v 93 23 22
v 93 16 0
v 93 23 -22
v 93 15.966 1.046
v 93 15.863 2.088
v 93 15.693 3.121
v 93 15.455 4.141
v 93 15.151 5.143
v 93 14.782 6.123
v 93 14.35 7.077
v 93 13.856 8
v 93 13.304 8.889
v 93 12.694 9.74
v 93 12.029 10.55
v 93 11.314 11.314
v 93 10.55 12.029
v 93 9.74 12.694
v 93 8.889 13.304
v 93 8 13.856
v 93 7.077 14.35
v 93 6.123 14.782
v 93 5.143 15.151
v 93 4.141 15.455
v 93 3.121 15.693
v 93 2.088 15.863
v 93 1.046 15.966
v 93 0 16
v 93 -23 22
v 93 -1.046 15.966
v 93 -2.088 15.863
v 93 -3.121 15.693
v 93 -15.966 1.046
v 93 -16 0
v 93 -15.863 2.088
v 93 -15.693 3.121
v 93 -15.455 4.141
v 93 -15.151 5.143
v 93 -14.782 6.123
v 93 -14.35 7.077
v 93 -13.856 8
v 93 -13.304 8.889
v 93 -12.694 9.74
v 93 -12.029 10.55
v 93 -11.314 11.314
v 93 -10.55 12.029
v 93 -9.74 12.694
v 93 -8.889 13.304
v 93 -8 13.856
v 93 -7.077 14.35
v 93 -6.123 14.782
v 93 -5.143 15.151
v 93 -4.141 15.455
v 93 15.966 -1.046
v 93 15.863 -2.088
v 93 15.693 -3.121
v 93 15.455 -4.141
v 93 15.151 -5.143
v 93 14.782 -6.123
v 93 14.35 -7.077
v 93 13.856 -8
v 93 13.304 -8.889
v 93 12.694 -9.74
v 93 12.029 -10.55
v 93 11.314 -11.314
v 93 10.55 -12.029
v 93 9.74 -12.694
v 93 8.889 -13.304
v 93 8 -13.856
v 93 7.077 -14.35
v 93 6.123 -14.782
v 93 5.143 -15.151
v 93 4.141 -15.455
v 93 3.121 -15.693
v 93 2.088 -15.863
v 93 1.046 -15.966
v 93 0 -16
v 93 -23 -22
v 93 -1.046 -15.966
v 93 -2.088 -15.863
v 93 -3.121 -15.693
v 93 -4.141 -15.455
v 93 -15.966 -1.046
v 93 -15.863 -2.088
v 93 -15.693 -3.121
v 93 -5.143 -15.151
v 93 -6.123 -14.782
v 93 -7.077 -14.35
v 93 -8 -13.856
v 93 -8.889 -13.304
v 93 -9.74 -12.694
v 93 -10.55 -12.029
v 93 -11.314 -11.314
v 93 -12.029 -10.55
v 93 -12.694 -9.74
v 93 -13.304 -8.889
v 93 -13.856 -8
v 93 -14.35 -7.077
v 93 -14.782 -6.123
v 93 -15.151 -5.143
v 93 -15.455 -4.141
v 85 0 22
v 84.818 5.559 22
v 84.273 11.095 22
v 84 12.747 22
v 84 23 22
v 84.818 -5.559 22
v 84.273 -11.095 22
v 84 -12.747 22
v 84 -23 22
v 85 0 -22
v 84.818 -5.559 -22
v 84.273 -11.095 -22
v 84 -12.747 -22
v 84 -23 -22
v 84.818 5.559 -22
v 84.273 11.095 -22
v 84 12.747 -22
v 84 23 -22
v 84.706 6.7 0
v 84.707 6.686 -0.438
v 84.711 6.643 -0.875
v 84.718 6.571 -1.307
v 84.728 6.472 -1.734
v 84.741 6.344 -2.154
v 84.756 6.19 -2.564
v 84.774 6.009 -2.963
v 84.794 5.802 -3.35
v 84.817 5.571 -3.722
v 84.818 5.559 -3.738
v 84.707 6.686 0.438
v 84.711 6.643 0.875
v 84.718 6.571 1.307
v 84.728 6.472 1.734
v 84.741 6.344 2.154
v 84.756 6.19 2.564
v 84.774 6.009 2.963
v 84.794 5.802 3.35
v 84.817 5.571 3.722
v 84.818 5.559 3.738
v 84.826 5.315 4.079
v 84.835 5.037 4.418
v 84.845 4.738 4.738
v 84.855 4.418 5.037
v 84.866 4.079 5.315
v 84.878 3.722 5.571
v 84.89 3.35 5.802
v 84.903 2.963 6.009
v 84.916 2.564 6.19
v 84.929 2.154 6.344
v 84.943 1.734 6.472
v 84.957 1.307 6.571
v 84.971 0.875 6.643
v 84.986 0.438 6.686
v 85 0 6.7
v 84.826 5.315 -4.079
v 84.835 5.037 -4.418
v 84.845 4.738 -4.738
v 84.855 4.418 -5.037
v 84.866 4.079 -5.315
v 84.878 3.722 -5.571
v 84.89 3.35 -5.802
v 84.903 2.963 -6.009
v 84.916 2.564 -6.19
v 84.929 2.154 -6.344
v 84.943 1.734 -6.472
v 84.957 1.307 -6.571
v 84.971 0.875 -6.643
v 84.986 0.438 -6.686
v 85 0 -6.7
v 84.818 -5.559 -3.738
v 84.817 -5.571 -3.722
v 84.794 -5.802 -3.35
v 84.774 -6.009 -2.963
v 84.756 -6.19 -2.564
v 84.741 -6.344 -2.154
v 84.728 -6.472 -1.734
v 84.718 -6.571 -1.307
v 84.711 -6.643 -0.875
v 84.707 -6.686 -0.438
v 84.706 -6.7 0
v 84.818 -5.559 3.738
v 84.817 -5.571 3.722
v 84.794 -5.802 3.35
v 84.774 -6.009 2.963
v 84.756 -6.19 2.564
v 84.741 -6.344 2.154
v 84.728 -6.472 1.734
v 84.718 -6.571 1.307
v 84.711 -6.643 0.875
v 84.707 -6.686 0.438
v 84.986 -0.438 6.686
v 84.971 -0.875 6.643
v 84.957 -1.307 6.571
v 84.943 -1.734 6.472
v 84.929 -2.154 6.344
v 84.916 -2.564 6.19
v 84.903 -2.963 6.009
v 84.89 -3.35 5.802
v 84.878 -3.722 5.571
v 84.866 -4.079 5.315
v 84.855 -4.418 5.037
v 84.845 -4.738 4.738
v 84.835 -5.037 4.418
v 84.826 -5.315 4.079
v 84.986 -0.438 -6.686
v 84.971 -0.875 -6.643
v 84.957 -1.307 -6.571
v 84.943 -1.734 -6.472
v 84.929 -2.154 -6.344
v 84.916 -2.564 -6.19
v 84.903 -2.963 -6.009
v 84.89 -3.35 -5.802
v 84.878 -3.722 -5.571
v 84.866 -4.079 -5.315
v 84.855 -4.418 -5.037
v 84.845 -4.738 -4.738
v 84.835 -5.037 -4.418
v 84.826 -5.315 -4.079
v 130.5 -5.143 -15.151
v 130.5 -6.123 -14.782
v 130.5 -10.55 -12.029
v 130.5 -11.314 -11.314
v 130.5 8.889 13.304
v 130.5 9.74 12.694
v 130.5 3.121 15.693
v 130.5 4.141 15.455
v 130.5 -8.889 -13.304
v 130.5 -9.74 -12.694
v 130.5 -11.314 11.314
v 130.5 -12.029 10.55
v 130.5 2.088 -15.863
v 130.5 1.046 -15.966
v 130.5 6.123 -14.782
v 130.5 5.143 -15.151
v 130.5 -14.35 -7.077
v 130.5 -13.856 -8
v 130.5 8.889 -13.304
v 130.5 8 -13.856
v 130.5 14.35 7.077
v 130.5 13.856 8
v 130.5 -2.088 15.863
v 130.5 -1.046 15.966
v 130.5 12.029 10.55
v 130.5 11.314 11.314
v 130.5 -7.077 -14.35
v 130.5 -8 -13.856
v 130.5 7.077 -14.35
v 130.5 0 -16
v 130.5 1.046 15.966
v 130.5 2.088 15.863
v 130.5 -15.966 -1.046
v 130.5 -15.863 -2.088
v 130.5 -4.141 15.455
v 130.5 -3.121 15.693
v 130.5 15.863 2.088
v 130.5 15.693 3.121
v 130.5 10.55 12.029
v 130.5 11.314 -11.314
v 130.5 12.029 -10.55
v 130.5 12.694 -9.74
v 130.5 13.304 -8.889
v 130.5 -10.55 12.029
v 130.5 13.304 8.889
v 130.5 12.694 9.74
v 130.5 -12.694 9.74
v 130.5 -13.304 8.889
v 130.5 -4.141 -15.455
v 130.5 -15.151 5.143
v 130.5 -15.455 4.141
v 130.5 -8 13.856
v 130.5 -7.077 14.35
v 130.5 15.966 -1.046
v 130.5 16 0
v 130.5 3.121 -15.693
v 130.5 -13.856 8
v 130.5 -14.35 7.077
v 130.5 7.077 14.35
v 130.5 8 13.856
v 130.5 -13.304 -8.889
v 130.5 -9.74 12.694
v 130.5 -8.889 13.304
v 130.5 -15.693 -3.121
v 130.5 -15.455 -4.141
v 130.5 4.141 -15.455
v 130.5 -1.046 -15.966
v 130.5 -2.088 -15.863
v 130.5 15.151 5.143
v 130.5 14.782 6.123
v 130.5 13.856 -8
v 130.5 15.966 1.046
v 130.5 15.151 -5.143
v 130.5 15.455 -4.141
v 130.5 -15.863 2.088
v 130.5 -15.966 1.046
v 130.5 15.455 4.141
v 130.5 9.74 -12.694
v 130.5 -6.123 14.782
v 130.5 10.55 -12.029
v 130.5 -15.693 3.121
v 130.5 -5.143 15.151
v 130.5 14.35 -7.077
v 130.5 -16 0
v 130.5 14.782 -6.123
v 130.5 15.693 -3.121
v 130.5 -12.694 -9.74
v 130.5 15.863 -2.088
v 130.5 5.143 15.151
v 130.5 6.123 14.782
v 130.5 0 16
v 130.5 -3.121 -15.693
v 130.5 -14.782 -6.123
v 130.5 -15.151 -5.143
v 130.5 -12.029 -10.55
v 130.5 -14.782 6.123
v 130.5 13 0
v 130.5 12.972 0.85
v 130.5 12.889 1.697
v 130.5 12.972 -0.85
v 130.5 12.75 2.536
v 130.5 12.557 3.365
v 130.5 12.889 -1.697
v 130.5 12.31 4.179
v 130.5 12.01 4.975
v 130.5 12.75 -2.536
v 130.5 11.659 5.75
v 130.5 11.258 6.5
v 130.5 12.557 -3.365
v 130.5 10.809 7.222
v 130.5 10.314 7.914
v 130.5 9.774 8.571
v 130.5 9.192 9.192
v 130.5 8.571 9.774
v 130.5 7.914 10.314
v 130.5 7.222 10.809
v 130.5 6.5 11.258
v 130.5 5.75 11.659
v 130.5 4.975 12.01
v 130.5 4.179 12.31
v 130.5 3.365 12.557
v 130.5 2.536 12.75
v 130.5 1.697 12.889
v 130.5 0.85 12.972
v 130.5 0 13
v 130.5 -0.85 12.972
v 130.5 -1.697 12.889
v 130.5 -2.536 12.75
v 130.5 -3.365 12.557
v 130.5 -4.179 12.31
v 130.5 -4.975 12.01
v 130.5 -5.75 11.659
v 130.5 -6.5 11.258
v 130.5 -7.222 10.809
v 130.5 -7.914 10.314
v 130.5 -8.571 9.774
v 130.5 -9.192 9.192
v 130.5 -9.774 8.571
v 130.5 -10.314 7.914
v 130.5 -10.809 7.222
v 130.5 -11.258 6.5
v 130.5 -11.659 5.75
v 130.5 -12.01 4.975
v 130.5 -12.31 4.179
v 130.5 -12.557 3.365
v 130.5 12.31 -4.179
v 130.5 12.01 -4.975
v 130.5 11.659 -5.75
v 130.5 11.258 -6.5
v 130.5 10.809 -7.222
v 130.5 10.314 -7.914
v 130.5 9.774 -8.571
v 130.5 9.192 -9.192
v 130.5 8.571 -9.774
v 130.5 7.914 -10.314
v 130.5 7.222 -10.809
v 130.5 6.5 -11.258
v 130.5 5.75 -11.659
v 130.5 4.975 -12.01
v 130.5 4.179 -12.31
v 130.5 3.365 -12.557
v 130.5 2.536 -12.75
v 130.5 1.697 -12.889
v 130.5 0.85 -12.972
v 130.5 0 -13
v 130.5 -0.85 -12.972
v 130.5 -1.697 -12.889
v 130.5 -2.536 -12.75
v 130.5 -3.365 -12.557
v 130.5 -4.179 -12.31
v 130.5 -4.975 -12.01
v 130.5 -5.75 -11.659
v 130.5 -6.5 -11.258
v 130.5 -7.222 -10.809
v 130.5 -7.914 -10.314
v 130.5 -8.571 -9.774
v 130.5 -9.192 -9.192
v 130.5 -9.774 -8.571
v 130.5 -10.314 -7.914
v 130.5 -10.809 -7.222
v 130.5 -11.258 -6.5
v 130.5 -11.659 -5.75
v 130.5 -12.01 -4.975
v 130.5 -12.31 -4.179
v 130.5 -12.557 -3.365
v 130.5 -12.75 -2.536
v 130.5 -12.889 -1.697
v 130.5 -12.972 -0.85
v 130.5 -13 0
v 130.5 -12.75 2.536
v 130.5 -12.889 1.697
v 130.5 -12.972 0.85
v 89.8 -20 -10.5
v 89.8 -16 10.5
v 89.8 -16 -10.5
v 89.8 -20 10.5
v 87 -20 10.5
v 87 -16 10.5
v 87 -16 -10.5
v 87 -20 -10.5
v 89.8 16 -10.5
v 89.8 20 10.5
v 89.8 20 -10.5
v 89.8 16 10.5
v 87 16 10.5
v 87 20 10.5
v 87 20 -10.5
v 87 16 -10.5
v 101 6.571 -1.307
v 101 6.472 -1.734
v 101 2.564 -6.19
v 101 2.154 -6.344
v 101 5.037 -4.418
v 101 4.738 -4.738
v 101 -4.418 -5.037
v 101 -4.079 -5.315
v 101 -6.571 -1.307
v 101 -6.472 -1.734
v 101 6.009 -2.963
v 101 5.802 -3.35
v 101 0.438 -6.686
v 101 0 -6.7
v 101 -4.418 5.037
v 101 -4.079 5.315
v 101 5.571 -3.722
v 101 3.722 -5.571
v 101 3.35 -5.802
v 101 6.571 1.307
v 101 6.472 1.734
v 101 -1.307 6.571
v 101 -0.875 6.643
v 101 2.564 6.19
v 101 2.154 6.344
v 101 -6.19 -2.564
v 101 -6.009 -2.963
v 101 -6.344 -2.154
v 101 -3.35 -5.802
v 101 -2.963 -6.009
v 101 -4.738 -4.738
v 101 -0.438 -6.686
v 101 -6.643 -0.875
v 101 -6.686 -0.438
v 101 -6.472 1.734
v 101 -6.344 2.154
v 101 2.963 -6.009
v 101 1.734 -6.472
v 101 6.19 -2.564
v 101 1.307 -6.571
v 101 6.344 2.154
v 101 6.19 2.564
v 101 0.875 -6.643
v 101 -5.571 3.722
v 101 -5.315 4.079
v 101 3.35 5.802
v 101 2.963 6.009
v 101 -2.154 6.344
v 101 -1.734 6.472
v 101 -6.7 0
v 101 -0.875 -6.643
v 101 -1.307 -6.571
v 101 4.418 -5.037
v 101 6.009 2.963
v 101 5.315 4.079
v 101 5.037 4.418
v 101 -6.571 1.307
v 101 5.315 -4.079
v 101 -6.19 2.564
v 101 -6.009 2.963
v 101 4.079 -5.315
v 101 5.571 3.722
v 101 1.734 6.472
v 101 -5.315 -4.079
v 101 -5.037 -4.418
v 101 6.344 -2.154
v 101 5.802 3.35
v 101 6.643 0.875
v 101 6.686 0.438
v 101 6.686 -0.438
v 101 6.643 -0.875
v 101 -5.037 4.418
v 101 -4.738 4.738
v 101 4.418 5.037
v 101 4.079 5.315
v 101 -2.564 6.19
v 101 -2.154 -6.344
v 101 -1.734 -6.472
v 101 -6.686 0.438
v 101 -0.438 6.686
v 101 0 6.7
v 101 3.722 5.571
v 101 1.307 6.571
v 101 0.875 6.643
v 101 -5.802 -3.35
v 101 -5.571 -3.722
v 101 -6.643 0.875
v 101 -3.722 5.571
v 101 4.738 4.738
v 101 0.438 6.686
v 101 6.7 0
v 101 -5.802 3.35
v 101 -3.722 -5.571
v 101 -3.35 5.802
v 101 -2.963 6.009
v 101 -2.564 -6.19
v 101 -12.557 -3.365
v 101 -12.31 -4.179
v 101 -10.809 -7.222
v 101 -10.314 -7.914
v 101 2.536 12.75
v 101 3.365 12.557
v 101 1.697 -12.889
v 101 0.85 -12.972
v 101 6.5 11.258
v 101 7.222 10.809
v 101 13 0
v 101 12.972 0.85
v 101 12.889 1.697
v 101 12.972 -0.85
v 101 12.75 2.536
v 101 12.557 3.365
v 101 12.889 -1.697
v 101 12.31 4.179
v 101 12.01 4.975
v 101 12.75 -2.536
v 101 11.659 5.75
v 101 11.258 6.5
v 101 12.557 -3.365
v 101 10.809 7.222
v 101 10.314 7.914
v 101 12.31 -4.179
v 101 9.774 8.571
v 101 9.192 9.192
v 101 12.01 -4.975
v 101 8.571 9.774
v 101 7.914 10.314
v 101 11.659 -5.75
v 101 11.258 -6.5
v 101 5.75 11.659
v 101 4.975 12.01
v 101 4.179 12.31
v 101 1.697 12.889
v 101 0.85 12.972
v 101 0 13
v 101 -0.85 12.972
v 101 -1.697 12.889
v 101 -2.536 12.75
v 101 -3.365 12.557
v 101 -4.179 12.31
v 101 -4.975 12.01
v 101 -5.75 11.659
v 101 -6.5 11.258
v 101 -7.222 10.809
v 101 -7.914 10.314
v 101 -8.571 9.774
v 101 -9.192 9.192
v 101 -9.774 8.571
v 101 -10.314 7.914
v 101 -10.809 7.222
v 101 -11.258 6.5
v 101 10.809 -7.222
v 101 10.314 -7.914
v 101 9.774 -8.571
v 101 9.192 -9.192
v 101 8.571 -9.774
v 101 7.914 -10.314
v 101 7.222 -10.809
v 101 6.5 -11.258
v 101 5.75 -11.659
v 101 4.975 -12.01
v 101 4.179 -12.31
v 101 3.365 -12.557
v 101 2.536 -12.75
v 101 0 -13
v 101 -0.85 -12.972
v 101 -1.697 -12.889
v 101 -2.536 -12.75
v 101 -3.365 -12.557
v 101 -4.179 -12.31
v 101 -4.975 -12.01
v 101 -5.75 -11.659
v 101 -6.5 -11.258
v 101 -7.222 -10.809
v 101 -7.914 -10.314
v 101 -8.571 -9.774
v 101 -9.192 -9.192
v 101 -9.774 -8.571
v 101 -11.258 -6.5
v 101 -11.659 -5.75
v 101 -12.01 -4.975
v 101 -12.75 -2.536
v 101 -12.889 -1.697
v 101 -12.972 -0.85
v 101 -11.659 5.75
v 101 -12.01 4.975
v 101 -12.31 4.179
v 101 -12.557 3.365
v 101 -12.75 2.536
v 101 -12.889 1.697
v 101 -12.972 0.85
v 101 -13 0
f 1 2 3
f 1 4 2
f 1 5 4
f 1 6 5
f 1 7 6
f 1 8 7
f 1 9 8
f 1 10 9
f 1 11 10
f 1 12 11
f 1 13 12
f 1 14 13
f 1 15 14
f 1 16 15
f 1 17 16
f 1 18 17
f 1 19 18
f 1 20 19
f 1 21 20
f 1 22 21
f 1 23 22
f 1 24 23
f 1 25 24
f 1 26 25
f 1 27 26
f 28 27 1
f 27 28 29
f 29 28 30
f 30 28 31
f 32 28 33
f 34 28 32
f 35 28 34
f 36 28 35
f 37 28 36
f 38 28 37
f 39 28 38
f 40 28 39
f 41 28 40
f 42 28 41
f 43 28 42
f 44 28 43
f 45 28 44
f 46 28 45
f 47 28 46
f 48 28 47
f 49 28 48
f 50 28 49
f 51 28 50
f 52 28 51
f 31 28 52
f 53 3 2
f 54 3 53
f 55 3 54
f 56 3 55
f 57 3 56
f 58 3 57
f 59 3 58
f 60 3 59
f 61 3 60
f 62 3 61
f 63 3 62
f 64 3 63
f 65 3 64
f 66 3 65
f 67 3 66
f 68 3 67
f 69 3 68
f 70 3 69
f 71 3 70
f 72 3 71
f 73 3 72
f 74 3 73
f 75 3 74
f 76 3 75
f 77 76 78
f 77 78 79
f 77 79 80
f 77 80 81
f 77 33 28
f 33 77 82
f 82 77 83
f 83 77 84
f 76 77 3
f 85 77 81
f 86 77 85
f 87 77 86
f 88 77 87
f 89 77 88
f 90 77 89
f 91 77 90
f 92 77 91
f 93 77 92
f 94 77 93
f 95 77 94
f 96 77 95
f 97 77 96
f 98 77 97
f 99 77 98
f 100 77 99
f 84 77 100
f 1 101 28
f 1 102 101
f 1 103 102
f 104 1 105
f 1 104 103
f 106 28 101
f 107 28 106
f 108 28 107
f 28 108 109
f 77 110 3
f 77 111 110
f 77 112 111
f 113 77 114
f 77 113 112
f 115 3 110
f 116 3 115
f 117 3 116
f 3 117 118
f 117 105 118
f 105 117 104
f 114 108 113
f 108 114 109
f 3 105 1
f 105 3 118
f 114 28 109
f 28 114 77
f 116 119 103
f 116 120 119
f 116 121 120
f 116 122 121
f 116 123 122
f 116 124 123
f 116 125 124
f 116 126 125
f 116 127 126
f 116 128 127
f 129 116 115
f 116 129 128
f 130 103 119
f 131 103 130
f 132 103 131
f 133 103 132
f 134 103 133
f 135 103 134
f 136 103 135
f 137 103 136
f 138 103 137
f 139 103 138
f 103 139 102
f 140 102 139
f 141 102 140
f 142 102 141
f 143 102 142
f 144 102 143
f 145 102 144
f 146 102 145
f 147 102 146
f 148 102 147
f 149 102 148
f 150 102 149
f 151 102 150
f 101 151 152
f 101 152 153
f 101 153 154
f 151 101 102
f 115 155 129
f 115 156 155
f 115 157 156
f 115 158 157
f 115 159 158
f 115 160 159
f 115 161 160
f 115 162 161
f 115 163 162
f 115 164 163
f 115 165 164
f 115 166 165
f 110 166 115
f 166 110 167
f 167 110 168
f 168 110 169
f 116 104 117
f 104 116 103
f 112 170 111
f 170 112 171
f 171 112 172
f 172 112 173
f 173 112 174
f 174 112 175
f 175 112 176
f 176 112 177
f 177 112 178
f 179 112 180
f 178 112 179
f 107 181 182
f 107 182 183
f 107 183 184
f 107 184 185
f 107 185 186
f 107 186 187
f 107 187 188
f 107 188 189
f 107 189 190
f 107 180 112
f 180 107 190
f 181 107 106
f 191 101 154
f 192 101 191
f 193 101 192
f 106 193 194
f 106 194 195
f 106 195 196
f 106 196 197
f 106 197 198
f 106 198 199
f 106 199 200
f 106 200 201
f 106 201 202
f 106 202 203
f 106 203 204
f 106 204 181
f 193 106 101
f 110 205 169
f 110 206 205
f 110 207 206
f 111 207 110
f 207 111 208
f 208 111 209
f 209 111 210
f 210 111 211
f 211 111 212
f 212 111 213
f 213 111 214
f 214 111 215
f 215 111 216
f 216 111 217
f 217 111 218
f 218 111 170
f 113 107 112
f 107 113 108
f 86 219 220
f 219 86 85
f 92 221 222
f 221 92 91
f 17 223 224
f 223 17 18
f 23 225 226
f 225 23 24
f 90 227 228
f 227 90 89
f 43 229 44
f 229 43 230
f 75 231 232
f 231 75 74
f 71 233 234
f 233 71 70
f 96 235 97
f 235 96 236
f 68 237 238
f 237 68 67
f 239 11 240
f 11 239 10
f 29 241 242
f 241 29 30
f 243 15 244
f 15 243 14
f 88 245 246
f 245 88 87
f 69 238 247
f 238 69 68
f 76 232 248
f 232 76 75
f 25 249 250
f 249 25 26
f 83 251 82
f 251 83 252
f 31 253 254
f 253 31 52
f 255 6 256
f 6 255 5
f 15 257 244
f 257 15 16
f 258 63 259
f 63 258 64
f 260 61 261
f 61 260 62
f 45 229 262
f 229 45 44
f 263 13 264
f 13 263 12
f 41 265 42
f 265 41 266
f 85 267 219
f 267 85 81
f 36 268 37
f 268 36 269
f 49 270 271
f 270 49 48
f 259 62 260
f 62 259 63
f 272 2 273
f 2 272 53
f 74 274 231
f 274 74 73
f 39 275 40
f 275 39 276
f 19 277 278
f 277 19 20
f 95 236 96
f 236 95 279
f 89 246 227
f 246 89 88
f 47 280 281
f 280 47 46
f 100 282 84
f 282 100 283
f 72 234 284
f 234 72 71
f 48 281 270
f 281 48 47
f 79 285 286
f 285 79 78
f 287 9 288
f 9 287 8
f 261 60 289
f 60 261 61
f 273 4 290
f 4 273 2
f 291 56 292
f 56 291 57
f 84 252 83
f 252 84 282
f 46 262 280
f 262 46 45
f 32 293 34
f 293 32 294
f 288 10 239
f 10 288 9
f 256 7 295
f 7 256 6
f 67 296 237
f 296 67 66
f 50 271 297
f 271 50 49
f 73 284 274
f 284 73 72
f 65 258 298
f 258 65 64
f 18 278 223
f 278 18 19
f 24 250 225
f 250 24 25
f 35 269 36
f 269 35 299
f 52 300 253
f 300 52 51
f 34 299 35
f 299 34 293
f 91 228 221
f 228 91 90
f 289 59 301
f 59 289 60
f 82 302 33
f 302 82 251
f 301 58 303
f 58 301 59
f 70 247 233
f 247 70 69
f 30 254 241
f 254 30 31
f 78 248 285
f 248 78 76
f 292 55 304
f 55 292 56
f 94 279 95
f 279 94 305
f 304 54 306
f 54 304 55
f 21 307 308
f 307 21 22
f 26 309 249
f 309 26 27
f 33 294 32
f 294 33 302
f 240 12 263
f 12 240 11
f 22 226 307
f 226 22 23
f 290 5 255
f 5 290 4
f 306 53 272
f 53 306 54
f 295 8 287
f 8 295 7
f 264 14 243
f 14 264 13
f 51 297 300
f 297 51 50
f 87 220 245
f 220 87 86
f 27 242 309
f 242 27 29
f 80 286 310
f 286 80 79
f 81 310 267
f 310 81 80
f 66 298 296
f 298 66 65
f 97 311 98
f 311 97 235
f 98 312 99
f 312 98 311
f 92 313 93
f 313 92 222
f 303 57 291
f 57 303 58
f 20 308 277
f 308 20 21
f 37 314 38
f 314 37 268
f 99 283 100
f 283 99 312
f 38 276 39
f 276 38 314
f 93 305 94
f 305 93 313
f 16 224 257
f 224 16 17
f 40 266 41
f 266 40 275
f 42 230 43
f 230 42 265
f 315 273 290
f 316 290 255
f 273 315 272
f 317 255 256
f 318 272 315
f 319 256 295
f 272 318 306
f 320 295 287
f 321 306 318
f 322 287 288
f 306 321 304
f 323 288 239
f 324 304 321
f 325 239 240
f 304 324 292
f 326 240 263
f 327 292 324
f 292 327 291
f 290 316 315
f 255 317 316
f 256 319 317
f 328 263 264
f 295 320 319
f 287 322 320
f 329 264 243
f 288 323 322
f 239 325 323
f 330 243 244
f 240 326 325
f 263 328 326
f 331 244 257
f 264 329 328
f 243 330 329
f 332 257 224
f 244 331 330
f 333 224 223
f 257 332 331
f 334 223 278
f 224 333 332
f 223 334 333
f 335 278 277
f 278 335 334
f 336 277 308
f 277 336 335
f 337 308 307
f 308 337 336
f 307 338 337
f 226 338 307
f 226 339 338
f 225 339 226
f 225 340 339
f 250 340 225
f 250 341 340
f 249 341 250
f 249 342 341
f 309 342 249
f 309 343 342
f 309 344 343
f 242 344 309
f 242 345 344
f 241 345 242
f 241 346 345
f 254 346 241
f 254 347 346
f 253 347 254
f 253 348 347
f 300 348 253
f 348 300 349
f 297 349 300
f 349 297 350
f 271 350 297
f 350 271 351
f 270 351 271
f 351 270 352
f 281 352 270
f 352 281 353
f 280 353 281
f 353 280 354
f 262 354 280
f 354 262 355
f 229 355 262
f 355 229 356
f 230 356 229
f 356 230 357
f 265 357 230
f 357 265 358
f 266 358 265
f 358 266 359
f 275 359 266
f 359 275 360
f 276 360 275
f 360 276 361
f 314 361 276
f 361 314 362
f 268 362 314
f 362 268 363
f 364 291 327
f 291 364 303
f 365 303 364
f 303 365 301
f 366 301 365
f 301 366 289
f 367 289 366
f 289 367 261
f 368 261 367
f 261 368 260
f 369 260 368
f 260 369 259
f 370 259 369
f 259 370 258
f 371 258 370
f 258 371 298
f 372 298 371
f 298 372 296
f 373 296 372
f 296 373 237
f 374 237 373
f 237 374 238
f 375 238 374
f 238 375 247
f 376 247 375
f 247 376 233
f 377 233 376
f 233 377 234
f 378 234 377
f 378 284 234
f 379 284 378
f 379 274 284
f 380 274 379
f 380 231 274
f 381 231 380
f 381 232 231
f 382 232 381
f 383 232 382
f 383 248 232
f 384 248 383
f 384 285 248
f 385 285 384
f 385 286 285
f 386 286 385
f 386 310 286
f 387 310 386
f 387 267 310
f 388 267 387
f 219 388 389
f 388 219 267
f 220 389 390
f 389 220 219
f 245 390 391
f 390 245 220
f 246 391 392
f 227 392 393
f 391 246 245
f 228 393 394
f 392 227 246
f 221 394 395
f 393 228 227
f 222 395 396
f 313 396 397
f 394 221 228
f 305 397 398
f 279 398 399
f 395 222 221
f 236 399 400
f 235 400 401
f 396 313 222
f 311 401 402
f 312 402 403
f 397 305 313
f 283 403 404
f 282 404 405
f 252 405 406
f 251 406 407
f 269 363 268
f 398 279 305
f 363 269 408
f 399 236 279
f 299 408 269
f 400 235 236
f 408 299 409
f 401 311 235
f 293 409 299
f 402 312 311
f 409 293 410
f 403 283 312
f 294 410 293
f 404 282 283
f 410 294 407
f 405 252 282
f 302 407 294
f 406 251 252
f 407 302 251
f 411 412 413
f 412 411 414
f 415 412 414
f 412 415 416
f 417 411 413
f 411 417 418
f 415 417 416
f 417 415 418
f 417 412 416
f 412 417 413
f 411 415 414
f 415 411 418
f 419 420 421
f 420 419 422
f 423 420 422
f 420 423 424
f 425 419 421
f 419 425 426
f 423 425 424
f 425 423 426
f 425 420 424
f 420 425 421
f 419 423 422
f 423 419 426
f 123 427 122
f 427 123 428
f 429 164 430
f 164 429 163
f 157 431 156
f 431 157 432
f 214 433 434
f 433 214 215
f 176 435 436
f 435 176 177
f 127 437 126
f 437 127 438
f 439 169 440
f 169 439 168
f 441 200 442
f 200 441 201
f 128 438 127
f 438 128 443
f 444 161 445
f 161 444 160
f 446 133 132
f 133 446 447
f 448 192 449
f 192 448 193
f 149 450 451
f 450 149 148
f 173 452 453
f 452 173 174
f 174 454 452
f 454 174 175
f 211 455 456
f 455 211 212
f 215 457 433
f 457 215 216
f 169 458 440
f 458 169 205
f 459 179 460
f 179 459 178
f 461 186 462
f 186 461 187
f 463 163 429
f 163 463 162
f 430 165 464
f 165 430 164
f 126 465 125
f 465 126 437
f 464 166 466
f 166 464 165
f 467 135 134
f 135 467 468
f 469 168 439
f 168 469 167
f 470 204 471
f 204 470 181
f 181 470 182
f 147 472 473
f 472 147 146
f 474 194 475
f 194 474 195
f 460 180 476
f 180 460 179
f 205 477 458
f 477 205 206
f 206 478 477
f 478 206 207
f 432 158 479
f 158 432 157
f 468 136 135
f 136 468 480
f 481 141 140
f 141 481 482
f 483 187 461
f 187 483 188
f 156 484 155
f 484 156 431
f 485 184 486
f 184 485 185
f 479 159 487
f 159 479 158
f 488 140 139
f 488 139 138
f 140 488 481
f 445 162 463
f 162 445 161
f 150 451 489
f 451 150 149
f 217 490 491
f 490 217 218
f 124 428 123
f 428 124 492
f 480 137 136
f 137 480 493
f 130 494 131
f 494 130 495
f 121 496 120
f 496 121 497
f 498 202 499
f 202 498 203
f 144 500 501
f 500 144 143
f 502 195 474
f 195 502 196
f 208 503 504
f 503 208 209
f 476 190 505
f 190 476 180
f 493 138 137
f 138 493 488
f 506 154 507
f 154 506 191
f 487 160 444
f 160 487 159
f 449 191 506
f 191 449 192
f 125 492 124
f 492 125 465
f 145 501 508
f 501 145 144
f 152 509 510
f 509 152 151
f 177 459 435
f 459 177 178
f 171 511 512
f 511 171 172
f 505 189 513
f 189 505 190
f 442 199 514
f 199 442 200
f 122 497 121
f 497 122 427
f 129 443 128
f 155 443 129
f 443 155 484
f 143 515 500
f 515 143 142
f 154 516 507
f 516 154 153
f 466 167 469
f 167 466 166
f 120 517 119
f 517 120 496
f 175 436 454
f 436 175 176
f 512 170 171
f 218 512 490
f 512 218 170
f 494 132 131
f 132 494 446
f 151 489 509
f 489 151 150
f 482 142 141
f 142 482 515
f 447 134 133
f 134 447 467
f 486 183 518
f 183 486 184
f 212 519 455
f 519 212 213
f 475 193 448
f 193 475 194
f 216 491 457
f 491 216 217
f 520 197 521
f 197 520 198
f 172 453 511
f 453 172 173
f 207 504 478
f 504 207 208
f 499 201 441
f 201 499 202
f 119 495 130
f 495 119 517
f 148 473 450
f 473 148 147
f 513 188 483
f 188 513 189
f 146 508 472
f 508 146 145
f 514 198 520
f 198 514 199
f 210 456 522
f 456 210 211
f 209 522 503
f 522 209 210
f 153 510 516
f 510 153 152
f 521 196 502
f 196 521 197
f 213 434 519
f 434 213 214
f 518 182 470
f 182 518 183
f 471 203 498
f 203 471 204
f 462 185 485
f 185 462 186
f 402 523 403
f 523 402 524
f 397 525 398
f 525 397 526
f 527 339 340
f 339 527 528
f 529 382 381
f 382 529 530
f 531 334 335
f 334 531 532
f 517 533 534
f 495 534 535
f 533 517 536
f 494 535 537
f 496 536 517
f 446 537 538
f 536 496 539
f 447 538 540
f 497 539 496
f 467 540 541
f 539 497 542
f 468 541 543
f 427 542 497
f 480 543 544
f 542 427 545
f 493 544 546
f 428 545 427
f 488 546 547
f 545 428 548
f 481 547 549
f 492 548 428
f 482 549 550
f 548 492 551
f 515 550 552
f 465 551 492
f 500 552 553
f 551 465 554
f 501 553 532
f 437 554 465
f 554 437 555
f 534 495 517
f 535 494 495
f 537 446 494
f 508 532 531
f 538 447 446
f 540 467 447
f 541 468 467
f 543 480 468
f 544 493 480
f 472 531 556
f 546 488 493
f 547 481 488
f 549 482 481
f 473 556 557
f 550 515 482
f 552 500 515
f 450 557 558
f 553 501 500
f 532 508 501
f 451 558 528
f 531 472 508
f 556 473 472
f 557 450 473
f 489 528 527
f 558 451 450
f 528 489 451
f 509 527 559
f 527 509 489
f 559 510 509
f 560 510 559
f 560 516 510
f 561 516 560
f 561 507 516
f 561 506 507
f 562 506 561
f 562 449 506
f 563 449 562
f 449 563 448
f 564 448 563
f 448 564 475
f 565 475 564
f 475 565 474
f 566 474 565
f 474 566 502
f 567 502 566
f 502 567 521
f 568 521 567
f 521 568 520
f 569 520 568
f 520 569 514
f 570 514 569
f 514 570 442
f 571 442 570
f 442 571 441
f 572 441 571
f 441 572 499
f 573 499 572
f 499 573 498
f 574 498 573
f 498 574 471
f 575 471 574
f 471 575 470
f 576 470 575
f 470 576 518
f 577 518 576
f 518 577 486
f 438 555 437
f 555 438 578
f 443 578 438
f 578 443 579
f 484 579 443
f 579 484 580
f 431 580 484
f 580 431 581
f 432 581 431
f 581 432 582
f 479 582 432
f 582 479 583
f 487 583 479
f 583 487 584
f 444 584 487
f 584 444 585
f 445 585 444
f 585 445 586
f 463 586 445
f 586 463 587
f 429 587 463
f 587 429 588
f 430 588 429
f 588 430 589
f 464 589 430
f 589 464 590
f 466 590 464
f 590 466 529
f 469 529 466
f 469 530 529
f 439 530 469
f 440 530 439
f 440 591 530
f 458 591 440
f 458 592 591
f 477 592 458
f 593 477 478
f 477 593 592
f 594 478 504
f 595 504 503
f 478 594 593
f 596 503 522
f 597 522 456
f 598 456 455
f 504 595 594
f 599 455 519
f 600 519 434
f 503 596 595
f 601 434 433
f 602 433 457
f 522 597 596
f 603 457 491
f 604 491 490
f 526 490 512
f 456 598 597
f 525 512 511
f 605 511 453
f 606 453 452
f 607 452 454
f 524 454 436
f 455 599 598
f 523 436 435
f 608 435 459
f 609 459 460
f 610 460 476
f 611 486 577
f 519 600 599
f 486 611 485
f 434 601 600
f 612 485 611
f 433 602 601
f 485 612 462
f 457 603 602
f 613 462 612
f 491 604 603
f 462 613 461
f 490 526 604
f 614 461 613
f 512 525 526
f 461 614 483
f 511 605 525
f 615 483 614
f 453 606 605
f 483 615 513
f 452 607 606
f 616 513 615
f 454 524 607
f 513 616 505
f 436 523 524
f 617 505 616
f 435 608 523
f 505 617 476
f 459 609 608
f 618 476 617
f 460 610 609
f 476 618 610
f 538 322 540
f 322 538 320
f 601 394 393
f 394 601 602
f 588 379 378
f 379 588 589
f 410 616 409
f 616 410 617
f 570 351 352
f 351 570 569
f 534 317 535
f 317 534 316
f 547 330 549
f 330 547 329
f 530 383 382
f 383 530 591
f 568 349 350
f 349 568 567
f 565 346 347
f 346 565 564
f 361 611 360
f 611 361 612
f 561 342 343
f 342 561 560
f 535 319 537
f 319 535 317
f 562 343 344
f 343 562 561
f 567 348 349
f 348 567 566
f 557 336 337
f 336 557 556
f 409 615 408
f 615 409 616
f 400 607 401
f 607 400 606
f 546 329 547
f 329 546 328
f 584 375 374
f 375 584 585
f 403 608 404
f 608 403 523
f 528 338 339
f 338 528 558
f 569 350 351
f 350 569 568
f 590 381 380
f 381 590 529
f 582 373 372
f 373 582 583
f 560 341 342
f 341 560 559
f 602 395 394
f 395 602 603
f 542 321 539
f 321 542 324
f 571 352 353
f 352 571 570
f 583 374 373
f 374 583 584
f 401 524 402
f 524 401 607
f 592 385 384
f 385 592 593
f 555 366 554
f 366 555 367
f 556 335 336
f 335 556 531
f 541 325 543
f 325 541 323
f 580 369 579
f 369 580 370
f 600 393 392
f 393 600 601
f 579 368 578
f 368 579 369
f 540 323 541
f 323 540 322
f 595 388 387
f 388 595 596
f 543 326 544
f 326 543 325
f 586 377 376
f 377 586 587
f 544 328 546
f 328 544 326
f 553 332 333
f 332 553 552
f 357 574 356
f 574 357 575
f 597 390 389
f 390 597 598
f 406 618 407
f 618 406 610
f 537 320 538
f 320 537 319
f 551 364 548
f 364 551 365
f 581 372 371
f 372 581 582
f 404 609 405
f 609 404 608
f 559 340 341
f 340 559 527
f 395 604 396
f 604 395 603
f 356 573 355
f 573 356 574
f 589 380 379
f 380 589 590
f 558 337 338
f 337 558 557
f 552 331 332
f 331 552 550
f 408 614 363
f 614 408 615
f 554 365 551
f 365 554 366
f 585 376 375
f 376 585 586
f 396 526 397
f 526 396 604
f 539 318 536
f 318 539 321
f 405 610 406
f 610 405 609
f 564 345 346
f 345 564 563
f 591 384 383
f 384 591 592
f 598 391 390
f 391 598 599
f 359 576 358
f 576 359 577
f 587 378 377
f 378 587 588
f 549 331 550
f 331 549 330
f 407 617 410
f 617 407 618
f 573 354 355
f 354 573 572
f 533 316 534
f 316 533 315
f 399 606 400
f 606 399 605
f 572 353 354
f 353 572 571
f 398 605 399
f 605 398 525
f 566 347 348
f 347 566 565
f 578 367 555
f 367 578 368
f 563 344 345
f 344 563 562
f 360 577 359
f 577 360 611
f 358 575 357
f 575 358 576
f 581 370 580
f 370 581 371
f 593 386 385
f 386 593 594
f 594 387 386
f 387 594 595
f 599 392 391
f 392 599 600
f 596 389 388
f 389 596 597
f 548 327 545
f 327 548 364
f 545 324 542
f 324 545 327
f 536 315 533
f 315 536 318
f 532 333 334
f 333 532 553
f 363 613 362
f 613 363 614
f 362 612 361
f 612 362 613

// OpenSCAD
// file: phytohydra_params.scad
// PhytoHydra v1 - shared parameters (all dimensions in mm)
// Open any part file in OpenSCAD (free, openscad.org), press F6, then File > Export > STL.
trunk_d      = 170;   // measure girth with a tape: trunk_d = girth / 3.1416
trunk_r      = trunk_d / 2;
wall         = 2.4;   // printed wall thickness (PA12, ASA or PETG)
strap_w      = 20;    // TPU strap / stainless band width
strap_t      = 2.2;
$fn          = 96;
// main file
// Acoustic Sentinel: saddle + housing. Stack inside (trunk side first):
// SS wear plate 13 x 1 mm, PZT disc 10 x 1 mm, tungsten-epoxy backing 12 x 6 mm,
// spring (wire 0.7, OD 13, free length 14), preamp PCB 22 mm disc, cap with cable gland.
include <phytohydra_params.scad>;
sad_w = 46; sad_h = 44; sad_t = 8;
h_od = 32; h_id = 26; h_len = 38;
aperture = 13.4;   // wear plate slides in this bore and protrudes 1.0 mm
difference() {
    union() {
        difference() {
            translate([trunk_r - 1, -sad_w/2, -sad_h/2]) cube([sad_t + 1, sad_w, sad_h]);
            cylinder(r = trunk_r, h = sad_h + 2, center = true);
        }
        translate([trunk_r + sad_t - 0.5, 0, 0]) rotate([0, 90, 0]) cylinder(d = h_od, h = h_len);
    }
    // bore for wear plate / PZT / backing stack, open to trunk
    translate([trunk_r - 2, 0, 0]) rotate([0, 90, 0]) cylinder(d = aperture, h = sad_t + 12);
    // main cavity for spring + preamp PCB, open at the back for the cap
    translate([trunk_r + sad_t + 8, 0, 0]) rotate([0, 90, 0]) cylinder(d = h_id, h = h_len);
    // strap slots
    for (s = [-1, 1]) translate([trunk_r + 2, s * (sad_w/2 - 5) - 2, -strap_w/2 - 0.5]) cube([strap_t + 0.6, 4, strap_w + 1]);
}
